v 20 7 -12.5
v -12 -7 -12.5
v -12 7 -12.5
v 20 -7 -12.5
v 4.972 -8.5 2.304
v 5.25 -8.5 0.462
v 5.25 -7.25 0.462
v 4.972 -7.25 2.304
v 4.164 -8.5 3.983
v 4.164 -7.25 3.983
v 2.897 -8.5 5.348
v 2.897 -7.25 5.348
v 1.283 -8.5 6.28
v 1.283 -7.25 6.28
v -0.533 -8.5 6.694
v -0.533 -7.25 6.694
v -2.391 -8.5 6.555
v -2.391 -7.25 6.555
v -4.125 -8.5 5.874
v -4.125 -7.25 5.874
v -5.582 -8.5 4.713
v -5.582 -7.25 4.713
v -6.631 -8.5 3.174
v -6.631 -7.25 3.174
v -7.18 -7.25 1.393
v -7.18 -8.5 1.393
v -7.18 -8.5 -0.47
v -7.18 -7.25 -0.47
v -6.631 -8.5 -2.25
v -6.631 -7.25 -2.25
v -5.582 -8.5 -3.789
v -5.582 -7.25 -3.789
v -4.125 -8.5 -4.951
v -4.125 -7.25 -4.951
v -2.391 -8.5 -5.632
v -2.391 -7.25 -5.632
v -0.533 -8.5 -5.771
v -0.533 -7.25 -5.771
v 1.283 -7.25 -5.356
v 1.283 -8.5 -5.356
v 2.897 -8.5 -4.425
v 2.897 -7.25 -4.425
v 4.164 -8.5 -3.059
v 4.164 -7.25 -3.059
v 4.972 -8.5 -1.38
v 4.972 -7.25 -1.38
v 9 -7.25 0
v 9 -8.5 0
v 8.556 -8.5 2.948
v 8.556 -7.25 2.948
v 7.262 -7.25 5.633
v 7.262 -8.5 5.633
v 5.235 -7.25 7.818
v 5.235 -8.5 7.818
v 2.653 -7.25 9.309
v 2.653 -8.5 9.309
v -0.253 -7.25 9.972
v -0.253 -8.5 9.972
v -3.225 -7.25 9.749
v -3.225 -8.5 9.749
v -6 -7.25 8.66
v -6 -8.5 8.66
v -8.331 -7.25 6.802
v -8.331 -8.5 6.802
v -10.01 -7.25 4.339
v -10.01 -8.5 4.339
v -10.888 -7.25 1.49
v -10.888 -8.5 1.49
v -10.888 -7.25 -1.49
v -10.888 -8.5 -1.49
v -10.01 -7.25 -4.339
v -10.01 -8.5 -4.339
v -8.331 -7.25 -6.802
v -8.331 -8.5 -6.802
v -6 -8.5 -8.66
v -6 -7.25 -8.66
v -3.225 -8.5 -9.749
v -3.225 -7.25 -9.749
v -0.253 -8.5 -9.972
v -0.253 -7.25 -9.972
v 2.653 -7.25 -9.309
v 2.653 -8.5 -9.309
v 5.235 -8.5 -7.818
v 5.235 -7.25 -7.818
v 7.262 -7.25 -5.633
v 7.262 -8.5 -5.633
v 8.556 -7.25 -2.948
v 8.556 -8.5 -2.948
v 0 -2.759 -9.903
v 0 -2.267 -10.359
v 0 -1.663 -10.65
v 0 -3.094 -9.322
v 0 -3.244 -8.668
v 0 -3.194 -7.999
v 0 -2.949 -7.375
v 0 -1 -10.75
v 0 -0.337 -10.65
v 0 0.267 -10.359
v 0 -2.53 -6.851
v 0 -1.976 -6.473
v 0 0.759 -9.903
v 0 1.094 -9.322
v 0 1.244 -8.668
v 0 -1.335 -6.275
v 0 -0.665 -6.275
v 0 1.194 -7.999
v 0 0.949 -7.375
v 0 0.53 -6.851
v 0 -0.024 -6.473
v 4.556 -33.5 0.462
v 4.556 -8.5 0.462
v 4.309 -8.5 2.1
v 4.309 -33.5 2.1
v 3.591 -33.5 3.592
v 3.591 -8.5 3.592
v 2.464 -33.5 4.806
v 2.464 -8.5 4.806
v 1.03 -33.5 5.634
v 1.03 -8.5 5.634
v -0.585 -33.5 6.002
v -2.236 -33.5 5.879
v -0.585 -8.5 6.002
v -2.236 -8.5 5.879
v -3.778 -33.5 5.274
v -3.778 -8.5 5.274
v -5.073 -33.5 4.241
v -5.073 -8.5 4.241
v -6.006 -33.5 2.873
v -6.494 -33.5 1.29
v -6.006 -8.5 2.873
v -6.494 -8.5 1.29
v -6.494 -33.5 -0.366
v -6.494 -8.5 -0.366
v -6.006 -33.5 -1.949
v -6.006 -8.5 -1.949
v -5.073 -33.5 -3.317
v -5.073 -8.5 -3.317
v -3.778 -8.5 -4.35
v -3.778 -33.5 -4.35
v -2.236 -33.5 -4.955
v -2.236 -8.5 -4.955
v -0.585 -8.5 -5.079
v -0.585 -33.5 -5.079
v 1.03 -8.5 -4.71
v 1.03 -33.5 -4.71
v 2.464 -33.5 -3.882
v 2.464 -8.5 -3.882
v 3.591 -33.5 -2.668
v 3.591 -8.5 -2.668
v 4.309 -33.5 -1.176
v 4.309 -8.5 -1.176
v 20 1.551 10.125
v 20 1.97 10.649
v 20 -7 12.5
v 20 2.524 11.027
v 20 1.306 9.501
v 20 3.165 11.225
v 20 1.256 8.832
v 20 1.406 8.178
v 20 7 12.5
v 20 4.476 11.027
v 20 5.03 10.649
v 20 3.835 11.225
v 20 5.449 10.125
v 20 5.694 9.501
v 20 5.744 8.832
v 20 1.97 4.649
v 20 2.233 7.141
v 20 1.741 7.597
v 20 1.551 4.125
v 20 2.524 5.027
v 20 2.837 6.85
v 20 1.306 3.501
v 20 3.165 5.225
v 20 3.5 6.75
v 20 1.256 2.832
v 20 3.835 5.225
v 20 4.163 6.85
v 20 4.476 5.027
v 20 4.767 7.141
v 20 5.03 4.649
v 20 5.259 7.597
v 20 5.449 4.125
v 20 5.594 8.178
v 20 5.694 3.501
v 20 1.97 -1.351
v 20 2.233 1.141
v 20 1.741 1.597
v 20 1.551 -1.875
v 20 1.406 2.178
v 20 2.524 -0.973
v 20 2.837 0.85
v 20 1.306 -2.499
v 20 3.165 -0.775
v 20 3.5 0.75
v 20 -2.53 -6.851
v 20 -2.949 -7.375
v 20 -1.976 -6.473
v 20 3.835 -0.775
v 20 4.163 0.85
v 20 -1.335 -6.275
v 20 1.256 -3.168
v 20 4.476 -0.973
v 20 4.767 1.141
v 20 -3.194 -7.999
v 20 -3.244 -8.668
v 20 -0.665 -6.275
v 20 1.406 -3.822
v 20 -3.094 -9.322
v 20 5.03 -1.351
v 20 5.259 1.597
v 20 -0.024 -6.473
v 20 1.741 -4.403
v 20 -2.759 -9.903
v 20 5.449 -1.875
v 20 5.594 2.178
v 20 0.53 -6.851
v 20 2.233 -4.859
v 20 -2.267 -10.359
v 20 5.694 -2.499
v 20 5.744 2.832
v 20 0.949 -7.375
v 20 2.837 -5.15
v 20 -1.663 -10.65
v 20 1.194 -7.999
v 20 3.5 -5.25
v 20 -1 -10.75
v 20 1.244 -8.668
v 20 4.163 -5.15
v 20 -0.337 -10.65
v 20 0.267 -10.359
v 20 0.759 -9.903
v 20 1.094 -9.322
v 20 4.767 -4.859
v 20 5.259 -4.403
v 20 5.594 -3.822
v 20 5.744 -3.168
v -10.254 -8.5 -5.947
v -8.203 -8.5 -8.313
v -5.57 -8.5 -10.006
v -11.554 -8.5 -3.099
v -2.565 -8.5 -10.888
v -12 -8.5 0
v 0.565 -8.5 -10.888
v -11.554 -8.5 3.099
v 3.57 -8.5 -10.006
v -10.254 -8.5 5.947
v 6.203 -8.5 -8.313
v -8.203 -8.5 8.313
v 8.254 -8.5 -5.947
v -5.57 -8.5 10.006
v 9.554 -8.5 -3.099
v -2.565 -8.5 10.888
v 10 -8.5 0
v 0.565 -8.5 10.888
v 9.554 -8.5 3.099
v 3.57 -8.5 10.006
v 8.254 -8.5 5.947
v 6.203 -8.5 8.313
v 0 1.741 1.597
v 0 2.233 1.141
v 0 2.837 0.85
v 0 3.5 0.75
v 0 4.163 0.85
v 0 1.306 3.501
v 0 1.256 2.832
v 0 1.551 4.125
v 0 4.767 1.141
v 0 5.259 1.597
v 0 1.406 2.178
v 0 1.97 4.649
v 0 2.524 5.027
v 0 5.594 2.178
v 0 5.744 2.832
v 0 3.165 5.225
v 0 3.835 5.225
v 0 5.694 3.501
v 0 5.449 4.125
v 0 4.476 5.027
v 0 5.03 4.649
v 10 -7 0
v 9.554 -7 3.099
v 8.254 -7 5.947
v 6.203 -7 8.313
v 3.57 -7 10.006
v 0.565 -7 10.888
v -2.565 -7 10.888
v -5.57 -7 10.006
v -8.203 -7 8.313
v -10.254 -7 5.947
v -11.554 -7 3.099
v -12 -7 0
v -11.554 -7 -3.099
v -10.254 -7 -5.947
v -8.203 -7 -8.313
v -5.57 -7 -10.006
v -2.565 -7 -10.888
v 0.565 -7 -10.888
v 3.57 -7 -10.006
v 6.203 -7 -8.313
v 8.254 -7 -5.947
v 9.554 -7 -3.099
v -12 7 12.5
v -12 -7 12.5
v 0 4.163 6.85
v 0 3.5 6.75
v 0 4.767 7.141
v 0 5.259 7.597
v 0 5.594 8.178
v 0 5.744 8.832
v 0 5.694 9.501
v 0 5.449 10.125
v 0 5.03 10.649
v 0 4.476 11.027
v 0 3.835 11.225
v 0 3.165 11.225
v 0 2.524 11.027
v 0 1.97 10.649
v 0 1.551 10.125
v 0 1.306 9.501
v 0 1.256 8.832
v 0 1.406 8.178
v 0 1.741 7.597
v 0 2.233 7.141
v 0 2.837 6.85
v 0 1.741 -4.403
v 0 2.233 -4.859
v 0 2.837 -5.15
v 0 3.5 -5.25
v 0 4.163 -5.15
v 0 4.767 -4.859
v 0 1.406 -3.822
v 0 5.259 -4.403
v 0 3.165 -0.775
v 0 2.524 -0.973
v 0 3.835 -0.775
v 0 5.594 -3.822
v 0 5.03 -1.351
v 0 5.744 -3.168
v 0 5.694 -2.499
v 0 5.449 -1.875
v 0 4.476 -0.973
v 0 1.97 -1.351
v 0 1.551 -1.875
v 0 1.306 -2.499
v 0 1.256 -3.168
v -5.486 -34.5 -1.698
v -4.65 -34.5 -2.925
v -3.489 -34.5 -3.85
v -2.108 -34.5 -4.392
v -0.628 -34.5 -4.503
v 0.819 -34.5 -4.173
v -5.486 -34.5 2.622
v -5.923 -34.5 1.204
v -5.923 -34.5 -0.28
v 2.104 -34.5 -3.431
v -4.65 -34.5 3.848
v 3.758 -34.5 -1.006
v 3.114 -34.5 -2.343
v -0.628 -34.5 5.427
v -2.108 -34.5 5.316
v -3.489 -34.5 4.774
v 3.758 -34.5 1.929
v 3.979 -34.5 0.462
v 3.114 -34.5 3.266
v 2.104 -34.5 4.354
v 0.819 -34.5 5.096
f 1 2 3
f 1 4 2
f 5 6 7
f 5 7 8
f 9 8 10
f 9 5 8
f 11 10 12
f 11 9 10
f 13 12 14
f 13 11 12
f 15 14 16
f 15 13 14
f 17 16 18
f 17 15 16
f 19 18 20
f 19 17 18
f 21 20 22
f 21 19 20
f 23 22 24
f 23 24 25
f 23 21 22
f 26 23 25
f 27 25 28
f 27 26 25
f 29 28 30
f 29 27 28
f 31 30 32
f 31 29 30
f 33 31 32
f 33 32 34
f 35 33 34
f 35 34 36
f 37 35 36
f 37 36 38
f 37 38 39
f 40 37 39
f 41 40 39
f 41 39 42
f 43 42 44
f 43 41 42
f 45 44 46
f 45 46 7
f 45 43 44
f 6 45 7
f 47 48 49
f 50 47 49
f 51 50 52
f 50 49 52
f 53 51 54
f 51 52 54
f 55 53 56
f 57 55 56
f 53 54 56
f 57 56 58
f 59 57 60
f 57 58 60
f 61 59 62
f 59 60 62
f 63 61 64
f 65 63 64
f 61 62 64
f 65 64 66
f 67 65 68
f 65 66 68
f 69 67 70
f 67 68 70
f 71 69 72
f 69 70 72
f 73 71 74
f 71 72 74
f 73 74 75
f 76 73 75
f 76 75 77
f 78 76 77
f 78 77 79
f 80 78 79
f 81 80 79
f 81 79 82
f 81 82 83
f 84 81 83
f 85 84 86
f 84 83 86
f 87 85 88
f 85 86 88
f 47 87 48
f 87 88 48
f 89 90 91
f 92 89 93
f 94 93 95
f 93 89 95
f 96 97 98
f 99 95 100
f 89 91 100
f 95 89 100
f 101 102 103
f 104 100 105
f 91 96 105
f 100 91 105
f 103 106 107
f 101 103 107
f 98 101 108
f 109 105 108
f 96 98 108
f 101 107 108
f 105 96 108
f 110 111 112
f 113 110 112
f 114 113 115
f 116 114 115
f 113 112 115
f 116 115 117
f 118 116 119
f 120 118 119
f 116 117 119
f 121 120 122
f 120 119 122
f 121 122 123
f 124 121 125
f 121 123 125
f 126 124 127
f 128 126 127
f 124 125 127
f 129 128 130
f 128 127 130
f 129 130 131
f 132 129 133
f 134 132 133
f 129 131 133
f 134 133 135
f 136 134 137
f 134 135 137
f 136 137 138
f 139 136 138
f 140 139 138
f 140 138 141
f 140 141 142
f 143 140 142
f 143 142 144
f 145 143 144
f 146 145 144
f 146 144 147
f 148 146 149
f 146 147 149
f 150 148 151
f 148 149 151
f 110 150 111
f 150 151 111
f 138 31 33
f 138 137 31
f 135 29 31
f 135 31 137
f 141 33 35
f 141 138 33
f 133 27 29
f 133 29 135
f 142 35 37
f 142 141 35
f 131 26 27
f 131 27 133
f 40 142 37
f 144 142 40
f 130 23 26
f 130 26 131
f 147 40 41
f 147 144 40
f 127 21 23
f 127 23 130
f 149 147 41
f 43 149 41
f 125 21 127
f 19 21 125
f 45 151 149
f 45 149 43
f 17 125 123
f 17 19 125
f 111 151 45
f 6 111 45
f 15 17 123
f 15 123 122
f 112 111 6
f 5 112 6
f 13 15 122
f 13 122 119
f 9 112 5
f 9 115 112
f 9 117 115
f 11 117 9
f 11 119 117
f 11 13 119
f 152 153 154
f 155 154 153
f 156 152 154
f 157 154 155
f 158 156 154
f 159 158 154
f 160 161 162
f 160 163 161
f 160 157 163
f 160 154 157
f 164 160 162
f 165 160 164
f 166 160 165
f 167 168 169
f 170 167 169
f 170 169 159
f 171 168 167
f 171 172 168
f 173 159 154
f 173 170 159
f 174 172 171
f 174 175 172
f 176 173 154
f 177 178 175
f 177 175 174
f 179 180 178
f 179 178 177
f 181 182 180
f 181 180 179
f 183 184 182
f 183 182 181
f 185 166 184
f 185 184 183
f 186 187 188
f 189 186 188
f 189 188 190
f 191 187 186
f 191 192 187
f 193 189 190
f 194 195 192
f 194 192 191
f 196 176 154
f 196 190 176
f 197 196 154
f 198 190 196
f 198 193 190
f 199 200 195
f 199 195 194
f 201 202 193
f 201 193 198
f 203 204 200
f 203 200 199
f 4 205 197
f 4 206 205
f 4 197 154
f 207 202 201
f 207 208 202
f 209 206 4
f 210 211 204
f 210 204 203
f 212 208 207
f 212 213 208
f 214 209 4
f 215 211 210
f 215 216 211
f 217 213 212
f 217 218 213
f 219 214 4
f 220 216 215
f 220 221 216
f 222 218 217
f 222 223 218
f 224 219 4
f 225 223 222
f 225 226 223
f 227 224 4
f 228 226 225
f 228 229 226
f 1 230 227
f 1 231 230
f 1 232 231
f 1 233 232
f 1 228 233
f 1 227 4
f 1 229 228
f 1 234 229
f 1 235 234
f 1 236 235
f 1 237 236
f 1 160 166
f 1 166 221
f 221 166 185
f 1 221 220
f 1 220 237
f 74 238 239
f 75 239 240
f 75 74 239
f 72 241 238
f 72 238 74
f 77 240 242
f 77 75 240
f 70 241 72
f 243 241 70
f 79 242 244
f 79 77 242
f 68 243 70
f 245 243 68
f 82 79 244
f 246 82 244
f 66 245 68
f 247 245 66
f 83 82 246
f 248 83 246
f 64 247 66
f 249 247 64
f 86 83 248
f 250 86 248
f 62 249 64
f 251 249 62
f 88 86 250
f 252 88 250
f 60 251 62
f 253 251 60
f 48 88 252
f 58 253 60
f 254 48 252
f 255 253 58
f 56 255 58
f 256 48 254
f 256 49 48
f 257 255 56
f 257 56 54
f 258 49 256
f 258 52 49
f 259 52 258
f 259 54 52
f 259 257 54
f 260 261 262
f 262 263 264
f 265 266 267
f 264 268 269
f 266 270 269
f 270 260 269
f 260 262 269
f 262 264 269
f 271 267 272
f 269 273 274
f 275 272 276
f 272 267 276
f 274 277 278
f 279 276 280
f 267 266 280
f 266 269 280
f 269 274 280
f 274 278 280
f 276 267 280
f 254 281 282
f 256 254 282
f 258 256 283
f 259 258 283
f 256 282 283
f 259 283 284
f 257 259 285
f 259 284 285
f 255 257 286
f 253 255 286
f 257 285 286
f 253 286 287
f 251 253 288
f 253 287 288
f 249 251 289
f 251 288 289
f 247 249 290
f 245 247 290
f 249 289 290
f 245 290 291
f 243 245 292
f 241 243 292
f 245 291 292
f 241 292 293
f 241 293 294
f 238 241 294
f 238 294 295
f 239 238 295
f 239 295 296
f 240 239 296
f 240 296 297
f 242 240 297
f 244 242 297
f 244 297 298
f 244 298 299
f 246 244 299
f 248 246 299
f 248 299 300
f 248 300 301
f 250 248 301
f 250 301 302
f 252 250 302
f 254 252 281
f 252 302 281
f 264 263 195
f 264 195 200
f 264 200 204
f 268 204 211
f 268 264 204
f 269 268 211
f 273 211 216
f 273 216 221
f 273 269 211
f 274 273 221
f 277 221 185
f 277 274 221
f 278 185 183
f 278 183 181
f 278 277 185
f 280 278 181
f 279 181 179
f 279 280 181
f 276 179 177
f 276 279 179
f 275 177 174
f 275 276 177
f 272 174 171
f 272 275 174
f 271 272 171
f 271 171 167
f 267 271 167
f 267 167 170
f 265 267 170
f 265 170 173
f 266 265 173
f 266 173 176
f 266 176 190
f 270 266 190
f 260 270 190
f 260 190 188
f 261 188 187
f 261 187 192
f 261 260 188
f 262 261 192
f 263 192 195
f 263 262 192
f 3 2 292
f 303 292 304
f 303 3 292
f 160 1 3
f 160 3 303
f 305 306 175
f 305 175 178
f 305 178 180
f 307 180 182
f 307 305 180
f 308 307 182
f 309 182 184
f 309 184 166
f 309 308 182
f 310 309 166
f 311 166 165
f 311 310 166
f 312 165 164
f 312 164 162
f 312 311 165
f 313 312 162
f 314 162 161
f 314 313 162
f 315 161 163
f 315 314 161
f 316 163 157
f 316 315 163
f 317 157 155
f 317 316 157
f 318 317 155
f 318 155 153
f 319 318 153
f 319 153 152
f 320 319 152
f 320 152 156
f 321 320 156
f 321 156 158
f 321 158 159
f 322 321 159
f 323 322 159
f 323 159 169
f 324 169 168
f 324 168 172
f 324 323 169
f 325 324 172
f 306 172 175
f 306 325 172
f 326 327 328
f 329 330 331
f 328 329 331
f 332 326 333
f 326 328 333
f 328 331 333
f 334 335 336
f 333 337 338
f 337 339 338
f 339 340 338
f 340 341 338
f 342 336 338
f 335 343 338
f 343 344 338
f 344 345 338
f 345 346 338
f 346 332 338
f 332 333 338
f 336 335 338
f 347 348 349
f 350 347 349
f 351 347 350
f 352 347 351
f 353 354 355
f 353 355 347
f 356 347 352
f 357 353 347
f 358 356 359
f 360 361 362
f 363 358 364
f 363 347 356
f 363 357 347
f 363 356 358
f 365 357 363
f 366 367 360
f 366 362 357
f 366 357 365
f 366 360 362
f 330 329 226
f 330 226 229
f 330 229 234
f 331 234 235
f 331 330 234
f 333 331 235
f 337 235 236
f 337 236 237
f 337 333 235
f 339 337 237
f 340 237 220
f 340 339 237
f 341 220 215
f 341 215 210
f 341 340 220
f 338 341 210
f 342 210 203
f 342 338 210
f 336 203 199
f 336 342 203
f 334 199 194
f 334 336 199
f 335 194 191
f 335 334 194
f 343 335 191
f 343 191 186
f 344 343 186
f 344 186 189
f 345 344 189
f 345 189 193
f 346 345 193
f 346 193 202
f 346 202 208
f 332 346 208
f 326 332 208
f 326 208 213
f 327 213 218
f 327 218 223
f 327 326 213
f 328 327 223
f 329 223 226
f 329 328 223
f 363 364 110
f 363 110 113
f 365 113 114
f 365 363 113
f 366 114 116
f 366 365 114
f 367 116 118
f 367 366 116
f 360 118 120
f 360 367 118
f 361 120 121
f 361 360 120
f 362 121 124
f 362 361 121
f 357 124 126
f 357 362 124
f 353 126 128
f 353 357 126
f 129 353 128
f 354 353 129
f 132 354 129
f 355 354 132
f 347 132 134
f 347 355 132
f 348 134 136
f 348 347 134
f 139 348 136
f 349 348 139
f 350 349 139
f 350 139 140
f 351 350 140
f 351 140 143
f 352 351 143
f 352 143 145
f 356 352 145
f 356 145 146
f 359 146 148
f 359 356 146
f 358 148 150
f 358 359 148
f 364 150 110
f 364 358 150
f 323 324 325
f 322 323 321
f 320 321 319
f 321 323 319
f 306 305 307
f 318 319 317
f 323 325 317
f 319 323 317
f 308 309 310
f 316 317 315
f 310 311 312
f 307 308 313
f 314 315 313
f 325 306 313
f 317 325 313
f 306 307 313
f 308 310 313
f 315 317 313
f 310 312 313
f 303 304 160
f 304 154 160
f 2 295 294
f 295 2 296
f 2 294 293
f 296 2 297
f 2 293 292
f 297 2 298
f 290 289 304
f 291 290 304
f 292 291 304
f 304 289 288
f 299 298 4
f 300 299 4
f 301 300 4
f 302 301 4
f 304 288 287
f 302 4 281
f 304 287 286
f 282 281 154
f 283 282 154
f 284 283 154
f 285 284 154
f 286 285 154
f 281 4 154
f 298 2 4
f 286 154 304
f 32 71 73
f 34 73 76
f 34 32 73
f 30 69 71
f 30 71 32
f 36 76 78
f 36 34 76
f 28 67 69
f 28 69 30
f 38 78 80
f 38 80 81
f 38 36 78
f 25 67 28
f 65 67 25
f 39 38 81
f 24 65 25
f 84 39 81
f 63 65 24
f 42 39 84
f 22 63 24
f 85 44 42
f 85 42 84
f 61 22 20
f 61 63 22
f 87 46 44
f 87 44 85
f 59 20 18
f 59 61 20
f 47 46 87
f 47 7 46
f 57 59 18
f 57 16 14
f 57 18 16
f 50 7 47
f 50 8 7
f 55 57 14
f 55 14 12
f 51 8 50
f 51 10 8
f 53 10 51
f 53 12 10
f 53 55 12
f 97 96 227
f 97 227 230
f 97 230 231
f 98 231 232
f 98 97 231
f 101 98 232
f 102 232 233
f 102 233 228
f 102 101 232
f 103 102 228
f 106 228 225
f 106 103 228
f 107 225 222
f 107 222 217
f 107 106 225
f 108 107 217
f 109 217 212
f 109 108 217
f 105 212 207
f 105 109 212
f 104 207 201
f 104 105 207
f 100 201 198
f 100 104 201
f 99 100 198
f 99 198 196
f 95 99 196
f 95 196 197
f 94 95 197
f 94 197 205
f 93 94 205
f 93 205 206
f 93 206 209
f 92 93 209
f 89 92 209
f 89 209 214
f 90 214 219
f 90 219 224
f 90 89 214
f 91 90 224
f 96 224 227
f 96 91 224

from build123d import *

# Parameters (mm, degrees)
SKETCH1_W           = 25
SKETCH1_H           = 14
SKETCH1_R           = 2.25
BOSS_EXTRUDE1_DEPTH = 20
SKETCH2_W           = 25
SKETCH2_H           = 14
BOSS_EXTRUDE2_DEPTH = 12
SKETCH3_R           = 11
BOSS_EXTRUDE3_DEPTH = 1.5
SKETCH4_R           = 10
SKETCH4_R_2         = 6.25
CUT_EXTRUDE1_DEPTH  = 1.25
SKETCH5_R           = 5.55625
BOSS_EXTRUDE4_DEPTH = 26
CHAMFER1_SIZE       = 1
CHAMFER1_SIZE2      = 0.577350269


with BuildPart() as part:
    # Sketch1 → Boss-Extrude1 (new body)
    with BuildSketch(Plane(origin=(0, 0, 0), x_dir=(0, 0, -1), z_dir=(1, 0, 0))):
        Rectangle(SKETCH1_W, SKETCH1_H)
        with Locations((8.5, -1)):
            Circle(SKETCH1_R, mode=Mode.SUBTRACT)
        with Locations((3, 3.5)):
            Circle(SKETCH1_R, mode=Mode.SUBTRACT)
        with Locations((-3, 3.5)):
            Circle(SKETCH1_R, mode=Mode.SUBTRACT)
        with Locations((-9, 3.5)):
            Circle(SKETCH1_R, mode=Mode.SUBTRACT)
    extrude(amount=BOSS_EXTRUDE1_DEPTH)

    # Sketch2 → Boss-Extrude2 (add)
    with BuildSketch(Plane.ZY):
        Rectangle(SKETCH2_W, SKETCH2_H)
    extrude(amount=BOSS_EXTRUDE2_DEPTH)

    # Sketch3 → Boss-Extrude3 (add)
    with BuildSketch(Plane.XZ.offset(7)):
        with Locations((-1, 0)):
            Circle(SKETCH3_R)
    extrude(amount=BOSS_EXTRUDE3_DEPTH)

    # Sketch4 → Cut-Extrude1 (cut)
    with BuildSketch(Plane.XZ.offset(8.5)):
        with Locations((-1, 0)):
            Circle(SKETCH4_R)
        with Locations((-1, 0.461771611)):
            Circle(SKETCH4_R_2, mode=Mode.SUBTRACT)
    extrude(amount=-CUT_EXTRUDE1_DEPTH, mode=Mode.SUBTRACT)

    # Sketch5 → Boss-Extrude4 (add)
    with BuildSketch(Plane.XZ.offset(8.5)):
        with Locations((-1, 0.461771611)):
            Circle(SKETCH5_R)
    extrude(amount=BOSS_EXTRUDE4_DEPTH)

    # Chamfer1
    chamfer1_edges = [part.edges().sort_by_distance(p)[0] for p in [
        (-6.55625, -34.5, 0.461771611),
    ]]
    chamfer1_side = [part.faces().sort_by_distance(p)[0] for p in [
        (-6.55625, -21.5, 0.461771611),
    ]]
    chamfer(chamfer1_edges, length=CHAMFER1_SIZE, length2=CHAMFER1_SIZE2, reference=chamfer1_side[0])


solid = part.part
